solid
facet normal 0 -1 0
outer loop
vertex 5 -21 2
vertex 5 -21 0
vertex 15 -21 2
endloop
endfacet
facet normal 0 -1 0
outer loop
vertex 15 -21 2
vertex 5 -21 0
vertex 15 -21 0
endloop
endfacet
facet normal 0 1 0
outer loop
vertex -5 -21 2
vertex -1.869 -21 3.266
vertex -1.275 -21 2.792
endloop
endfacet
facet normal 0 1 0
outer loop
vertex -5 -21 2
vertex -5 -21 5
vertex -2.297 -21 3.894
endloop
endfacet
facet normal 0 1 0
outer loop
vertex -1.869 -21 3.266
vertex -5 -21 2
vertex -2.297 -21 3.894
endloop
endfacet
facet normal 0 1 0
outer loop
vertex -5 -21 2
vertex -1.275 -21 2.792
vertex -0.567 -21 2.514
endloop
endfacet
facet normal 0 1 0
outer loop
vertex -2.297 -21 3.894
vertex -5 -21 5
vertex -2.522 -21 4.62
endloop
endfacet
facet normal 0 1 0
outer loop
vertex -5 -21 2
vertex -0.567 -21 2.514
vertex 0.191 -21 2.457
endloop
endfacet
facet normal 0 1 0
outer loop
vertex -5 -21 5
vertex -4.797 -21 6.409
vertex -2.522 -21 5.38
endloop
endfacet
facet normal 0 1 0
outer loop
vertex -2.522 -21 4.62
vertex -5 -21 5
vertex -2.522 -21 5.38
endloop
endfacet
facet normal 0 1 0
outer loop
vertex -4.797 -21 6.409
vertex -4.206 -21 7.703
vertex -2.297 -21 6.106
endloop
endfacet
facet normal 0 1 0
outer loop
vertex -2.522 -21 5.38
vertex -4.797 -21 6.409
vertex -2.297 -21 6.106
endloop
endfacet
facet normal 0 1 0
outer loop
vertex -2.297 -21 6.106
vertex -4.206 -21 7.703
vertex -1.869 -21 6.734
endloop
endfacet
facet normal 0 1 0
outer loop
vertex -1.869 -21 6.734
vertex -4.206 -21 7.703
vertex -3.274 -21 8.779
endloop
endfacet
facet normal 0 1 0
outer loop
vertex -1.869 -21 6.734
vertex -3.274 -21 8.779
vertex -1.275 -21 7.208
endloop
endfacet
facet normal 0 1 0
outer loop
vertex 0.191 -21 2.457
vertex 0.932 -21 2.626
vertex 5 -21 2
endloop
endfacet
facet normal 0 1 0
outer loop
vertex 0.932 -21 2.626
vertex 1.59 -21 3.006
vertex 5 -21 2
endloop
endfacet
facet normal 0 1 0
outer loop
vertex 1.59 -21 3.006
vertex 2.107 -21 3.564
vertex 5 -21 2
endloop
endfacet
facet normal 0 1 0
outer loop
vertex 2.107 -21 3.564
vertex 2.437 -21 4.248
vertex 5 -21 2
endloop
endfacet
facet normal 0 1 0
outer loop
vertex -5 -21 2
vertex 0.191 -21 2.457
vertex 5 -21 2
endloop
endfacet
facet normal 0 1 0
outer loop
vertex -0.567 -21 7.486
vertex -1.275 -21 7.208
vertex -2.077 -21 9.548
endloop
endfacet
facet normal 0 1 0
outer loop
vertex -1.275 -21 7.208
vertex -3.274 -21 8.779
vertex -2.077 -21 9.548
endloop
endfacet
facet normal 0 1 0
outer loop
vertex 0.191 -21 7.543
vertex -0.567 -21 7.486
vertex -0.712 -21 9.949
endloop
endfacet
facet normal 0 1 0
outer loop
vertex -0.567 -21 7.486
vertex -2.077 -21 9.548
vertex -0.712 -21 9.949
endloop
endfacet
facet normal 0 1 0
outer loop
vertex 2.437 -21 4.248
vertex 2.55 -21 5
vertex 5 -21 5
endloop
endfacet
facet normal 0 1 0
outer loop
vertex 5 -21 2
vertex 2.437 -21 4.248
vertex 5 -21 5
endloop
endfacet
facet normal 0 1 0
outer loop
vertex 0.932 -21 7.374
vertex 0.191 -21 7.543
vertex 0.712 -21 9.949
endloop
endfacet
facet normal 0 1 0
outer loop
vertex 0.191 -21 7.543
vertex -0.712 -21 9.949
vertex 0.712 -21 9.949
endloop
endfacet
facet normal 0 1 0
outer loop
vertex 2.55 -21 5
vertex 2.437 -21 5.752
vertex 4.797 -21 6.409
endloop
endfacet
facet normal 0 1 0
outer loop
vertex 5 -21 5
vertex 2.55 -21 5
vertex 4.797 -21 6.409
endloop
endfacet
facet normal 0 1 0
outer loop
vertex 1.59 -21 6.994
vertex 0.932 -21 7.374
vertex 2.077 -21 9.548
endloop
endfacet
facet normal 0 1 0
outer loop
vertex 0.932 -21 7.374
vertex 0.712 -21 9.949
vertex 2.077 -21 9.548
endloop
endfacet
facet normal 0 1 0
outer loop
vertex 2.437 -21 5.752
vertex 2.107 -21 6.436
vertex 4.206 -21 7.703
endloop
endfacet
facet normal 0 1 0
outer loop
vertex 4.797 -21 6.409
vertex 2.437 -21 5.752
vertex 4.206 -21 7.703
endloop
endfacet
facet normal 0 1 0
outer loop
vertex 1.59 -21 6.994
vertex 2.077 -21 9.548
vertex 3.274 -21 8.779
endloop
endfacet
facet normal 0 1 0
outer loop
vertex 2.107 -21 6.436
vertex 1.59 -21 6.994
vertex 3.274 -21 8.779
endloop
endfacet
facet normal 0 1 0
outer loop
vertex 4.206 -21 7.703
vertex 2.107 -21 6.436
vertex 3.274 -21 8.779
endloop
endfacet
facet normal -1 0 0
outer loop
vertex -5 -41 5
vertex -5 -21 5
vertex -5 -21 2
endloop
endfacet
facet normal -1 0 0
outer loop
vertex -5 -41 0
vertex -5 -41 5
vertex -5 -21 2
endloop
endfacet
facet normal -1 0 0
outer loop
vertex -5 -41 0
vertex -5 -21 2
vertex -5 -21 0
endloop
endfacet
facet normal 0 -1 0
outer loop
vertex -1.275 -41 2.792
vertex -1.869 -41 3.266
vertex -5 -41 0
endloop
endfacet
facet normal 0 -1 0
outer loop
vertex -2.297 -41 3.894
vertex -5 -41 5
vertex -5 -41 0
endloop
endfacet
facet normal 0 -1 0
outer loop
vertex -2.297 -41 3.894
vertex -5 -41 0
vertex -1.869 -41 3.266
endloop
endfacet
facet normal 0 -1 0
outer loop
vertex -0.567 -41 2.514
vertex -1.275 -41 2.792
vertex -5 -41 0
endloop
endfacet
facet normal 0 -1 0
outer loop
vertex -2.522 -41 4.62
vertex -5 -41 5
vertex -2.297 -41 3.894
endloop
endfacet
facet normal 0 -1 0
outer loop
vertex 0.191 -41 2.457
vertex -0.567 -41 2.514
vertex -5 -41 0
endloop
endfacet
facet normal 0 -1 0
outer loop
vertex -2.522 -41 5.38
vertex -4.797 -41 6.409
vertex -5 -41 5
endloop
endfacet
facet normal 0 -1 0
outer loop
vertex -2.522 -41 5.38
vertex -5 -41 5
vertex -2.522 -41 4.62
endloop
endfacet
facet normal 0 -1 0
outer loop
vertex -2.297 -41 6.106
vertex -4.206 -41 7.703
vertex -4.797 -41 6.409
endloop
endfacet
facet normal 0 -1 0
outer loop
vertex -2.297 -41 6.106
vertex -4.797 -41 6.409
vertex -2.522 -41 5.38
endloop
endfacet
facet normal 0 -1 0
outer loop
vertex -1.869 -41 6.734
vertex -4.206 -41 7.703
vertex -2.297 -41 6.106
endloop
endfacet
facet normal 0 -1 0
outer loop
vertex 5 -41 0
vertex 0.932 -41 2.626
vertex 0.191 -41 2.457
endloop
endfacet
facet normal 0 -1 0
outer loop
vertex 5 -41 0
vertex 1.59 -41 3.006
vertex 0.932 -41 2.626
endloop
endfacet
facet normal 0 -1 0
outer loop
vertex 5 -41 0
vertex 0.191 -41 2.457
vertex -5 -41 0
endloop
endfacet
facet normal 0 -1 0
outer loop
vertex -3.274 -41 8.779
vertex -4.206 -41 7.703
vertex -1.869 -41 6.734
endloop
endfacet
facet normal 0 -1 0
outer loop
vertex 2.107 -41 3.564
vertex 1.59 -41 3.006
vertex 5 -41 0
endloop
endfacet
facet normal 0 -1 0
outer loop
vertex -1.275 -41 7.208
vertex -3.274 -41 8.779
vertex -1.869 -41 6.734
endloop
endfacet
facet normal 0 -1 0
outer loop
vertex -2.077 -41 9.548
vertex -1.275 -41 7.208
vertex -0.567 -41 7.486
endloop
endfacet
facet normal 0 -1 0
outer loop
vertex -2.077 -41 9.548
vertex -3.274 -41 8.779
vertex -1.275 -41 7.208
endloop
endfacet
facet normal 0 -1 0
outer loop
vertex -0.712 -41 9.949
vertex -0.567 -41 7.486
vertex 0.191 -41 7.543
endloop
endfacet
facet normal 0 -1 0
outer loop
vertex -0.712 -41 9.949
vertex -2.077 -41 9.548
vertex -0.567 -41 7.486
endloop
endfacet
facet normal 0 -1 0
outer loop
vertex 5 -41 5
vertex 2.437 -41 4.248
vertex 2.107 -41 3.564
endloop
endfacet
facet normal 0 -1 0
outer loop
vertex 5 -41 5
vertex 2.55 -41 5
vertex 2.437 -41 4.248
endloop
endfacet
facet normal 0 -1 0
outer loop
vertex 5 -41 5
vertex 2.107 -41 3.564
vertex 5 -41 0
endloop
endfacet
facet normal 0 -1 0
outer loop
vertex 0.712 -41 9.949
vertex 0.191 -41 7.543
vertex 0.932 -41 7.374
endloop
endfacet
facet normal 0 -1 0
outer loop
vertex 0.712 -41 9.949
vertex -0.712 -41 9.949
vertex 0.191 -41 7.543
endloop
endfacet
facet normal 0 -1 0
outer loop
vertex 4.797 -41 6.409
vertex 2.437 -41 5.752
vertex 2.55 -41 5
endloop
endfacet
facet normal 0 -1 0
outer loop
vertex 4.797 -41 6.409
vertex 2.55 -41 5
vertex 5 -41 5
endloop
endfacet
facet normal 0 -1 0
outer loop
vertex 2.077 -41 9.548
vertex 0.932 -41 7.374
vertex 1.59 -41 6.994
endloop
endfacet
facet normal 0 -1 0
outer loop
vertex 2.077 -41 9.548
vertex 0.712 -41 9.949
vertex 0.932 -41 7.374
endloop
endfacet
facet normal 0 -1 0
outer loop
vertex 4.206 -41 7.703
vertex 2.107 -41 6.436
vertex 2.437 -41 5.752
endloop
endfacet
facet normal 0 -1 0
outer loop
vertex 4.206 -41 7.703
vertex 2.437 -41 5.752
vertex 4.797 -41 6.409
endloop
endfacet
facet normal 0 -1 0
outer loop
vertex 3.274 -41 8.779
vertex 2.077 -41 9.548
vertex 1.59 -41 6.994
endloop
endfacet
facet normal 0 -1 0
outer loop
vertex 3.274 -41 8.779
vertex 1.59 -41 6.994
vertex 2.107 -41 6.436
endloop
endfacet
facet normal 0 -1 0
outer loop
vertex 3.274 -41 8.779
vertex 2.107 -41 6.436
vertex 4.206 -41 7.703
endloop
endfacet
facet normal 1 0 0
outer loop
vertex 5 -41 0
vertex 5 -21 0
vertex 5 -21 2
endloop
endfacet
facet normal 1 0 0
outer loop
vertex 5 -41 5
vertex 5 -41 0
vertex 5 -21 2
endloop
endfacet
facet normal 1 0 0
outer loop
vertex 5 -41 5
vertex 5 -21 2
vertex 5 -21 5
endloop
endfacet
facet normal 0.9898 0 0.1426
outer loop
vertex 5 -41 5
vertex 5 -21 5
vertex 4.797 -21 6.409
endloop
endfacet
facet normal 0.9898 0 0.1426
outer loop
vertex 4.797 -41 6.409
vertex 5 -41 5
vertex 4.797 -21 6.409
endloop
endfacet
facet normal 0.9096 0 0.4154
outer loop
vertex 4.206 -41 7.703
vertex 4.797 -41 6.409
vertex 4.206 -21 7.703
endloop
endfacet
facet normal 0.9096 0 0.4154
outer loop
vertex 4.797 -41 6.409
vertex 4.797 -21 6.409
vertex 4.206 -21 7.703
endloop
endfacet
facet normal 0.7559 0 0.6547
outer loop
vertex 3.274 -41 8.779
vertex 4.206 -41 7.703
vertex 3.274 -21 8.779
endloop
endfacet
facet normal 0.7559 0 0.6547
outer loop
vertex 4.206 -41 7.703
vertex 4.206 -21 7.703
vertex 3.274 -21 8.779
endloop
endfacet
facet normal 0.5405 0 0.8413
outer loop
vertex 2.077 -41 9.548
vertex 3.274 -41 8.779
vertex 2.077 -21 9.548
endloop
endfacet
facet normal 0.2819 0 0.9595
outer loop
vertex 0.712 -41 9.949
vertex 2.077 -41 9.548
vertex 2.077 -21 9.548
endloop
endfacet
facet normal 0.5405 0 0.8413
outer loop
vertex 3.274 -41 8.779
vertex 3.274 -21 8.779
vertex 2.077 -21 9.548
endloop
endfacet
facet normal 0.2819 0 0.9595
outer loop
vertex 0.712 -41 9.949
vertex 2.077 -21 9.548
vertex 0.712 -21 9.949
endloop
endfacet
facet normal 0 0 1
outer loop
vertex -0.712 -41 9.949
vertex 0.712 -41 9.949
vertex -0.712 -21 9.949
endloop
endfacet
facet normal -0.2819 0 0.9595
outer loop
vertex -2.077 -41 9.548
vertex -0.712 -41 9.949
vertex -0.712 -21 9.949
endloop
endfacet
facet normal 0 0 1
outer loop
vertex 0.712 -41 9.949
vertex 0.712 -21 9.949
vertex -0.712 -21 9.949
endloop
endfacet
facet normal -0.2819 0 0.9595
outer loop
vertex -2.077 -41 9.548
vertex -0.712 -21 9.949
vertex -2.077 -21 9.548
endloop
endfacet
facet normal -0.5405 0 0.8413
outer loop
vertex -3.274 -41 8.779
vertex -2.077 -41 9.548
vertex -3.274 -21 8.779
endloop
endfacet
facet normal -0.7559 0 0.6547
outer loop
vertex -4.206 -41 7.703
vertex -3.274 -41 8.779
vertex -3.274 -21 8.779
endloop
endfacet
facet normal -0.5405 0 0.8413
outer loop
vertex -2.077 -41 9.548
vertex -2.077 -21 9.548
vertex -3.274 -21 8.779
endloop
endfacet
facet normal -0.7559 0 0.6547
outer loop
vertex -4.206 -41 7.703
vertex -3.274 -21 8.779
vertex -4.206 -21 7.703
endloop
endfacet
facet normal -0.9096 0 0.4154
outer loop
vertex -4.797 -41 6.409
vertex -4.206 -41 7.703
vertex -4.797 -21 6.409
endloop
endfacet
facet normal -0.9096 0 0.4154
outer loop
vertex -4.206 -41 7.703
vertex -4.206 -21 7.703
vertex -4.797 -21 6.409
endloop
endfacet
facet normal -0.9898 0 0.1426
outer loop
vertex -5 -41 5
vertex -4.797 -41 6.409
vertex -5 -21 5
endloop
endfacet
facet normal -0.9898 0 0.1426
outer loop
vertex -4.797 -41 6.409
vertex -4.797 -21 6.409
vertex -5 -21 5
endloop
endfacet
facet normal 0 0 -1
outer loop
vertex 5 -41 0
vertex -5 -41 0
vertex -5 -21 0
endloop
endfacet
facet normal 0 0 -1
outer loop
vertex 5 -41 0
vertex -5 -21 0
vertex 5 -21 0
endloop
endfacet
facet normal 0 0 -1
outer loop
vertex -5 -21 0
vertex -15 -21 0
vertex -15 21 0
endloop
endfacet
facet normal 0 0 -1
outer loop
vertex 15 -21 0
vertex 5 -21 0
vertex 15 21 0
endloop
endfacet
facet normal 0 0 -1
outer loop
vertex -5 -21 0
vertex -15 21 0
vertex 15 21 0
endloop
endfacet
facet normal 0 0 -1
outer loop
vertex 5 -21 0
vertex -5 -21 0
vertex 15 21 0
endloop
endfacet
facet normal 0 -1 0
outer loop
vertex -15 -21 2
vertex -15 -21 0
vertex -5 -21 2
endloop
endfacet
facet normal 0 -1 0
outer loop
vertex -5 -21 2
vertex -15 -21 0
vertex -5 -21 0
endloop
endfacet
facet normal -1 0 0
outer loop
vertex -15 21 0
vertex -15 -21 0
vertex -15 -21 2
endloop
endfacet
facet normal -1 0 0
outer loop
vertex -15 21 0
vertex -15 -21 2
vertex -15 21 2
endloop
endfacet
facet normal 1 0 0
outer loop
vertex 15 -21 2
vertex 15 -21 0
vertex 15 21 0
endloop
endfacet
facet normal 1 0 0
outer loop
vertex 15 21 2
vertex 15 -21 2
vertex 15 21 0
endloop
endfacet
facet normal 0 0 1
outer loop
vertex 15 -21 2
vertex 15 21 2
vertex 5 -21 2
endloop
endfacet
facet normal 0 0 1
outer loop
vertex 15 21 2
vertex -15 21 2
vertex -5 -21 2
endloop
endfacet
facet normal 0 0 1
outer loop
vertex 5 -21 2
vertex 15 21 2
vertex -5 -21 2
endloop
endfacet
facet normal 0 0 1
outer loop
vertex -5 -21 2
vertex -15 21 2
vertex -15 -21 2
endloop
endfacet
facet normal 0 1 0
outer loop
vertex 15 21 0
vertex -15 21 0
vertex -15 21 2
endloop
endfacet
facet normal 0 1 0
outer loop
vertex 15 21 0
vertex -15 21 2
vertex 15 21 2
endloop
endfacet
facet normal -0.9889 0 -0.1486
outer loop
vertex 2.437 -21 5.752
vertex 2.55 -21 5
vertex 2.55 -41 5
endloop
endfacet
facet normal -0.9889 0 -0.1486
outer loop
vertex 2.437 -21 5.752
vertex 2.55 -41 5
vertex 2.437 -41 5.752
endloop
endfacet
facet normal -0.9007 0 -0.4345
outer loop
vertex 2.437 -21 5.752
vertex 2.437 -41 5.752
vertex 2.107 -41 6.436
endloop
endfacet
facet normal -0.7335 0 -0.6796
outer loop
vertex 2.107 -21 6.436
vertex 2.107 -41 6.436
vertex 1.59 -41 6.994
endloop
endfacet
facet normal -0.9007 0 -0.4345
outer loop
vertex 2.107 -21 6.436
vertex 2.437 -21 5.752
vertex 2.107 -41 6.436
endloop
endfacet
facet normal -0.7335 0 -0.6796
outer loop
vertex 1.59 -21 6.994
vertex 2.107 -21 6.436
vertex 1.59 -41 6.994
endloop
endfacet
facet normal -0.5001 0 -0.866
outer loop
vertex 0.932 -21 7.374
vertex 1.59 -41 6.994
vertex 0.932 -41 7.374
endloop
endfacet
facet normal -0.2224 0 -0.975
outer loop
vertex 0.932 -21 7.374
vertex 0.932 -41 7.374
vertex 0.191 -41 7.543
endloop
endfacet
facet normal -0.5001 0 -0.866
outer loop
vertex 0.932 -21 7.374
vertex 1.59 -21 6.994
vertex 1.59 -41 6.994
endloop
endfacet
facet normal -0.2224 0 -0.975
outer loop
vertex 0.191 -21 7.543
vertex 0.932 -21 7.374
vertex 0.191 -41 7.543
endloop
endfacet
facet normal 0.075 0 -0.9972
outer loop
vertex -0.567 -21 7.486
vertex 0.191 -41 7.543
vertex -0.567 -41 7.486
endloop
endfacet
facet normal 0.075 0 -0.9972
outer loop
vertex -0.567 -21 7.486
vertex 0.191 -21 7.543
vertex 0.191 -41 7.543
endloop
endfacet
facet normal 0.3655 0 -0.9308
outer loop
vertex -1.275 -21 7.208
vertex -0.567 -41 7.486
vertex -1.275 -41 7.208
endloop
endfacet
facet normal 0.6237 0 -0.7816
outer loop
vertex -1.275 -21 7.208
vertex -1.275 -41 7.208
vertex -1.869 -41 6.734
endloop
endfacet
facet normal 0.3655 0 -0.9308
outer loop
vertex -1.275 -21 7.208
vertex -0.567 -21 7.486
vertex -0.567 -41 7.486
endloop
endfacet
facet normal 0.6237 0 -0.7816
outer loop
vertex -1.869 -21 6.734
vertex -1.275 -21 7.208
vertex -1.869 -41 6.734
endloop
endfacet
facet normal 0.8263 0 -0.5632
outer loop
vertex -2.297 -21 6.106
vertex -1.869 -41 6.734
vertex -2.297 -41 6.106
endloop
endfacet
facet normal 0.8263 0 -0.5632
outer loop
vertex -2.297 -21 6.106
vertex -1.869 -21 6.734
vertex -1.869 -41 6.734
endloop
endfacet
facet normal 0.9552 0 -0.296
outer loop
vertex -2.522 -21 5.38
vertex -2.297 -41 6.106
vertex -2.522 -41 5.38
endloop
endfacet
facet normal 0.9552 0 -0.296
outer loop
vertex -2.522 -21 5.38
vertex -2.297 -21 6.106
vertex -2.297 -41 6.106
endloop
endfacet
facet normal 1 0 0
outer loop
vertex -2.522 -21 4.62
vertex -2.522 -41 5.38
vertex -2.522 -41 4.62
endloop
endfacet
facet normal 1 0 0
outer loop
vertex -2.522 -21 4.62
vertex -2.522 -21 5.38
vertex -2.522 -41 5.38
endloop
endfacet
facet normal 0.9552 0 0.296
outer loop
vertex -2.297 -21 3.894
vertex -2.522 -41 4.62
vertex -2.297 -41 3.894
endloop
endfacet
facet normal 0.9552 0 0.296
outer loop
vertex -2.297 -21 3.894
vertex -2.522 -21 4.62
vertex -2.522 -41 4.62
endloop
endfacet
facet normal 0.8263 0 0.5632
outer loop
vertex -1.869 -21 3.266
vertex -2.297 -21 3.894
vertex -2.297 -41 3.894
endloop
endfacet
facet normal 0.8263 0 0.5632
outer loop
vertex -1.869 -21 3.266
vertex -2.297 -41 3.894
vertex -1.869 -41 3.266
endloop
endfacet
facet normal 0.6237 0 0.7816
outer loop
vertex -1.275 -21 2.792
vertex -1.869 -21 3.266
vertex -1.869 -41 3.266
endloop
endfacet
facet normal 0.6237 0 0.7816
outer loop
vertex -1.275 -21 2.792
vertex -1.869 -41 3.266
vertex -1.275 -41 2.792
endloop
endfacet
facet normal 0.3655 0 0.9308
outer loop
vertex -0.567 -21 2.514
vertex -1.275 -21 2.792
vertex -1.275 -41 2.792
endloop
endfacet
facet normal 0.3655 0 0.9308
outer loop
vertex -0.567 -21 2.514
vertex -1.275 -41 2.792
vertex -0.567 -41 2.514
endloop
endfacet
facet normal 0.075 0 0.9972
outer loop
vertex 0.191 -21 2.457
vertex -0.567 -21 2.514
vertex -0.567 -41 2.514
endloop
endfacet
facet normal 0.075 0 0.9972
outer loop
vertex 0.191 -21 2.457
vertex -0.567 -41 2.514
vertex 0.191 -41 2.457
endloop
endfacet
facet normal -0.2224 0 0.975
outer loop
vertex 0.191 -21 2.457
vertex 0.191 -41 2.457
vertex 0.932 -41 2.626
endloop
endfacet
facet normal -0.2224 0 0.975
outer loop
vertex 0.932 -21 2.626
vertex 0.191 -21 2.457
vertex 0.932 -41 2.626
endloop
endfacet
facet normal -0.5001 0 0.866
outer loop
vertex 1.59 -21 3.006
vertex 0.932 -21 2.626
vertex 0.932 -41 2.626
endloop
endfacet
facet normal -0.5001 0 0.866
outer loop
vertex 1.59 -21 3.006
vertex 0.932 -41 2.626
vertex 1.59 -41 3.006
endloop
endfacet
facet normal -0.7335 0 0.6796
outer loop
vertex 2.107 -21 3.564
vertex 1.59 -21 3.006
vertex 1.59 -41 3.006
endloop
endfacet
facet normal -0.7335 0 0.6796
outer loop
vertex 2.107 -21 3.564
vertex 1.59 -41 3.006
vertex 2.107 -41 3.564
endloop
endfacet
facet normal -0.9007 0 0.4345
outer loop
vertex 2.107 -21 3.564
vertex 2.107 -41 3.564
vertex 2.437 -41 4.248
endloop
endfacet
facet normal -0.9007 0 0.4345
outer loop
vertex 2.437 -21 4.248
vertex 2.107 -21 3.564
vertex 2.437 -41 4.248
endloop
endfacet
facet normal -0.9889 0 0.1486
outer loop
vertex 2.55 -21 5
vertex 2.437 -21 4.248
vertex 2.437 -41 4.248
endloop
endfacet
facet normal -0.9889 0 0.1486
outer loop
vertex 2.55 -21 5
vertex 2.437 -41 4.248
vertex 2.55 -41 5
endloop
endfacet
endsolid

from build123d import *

# Parameters (mm, degrees)
SKETCH_W     = 30
SKETCH_H     = 42
PAD_DEPTH    = 5
SKETCH001_R  = 2.55
PAD001_DEPTH = 20
SKETCH002_W  = 42
SKETCH002_H  = 3
POCKET_DEPTH = 30.001


with BuildPart() as part:
    # Sketch → Pad (new body)
    with BuildSketch(Plane.XY):
        Rectangle(SKETCH_W, SKETCH_H)
    extrude(amount=PAD_DEPTH)

    # Sketch001 (on Face3 of Pad) → Pad001 (join)
    with BuildSketch(Plane.XZ.offset(21)):
        with BuildLine():
            ThreePointArc((5, 5), (0, 10), (-5, 5))
            Line((-5, 5), (-5, 0))
            Line((-5, 0), (5, 0))
            Line((5, 0), (5, 5))
        make_face()
        with Locations((0, 5)):
            Circle(SKETCH001_R, mode=Mode.SUBTRACT)
    extrude(amount=PAD001_DEPTH)

    # Sketch002 (on Face2 of Pad001) → Pocket (cut, through all)
    with BuildSketch(Plane(origin=(-15, 0, 0), x_dir=(0, -1, 0), z_dir=(-1, 0, 0))):
        with Locations((0, 3.5)):
            Rectangle(SKETCH002_W, SKETCH002_H)
    extrude(amount=-POCKET_DEPTH, mode=Mode.SUBTRACT)


solid = part.part
